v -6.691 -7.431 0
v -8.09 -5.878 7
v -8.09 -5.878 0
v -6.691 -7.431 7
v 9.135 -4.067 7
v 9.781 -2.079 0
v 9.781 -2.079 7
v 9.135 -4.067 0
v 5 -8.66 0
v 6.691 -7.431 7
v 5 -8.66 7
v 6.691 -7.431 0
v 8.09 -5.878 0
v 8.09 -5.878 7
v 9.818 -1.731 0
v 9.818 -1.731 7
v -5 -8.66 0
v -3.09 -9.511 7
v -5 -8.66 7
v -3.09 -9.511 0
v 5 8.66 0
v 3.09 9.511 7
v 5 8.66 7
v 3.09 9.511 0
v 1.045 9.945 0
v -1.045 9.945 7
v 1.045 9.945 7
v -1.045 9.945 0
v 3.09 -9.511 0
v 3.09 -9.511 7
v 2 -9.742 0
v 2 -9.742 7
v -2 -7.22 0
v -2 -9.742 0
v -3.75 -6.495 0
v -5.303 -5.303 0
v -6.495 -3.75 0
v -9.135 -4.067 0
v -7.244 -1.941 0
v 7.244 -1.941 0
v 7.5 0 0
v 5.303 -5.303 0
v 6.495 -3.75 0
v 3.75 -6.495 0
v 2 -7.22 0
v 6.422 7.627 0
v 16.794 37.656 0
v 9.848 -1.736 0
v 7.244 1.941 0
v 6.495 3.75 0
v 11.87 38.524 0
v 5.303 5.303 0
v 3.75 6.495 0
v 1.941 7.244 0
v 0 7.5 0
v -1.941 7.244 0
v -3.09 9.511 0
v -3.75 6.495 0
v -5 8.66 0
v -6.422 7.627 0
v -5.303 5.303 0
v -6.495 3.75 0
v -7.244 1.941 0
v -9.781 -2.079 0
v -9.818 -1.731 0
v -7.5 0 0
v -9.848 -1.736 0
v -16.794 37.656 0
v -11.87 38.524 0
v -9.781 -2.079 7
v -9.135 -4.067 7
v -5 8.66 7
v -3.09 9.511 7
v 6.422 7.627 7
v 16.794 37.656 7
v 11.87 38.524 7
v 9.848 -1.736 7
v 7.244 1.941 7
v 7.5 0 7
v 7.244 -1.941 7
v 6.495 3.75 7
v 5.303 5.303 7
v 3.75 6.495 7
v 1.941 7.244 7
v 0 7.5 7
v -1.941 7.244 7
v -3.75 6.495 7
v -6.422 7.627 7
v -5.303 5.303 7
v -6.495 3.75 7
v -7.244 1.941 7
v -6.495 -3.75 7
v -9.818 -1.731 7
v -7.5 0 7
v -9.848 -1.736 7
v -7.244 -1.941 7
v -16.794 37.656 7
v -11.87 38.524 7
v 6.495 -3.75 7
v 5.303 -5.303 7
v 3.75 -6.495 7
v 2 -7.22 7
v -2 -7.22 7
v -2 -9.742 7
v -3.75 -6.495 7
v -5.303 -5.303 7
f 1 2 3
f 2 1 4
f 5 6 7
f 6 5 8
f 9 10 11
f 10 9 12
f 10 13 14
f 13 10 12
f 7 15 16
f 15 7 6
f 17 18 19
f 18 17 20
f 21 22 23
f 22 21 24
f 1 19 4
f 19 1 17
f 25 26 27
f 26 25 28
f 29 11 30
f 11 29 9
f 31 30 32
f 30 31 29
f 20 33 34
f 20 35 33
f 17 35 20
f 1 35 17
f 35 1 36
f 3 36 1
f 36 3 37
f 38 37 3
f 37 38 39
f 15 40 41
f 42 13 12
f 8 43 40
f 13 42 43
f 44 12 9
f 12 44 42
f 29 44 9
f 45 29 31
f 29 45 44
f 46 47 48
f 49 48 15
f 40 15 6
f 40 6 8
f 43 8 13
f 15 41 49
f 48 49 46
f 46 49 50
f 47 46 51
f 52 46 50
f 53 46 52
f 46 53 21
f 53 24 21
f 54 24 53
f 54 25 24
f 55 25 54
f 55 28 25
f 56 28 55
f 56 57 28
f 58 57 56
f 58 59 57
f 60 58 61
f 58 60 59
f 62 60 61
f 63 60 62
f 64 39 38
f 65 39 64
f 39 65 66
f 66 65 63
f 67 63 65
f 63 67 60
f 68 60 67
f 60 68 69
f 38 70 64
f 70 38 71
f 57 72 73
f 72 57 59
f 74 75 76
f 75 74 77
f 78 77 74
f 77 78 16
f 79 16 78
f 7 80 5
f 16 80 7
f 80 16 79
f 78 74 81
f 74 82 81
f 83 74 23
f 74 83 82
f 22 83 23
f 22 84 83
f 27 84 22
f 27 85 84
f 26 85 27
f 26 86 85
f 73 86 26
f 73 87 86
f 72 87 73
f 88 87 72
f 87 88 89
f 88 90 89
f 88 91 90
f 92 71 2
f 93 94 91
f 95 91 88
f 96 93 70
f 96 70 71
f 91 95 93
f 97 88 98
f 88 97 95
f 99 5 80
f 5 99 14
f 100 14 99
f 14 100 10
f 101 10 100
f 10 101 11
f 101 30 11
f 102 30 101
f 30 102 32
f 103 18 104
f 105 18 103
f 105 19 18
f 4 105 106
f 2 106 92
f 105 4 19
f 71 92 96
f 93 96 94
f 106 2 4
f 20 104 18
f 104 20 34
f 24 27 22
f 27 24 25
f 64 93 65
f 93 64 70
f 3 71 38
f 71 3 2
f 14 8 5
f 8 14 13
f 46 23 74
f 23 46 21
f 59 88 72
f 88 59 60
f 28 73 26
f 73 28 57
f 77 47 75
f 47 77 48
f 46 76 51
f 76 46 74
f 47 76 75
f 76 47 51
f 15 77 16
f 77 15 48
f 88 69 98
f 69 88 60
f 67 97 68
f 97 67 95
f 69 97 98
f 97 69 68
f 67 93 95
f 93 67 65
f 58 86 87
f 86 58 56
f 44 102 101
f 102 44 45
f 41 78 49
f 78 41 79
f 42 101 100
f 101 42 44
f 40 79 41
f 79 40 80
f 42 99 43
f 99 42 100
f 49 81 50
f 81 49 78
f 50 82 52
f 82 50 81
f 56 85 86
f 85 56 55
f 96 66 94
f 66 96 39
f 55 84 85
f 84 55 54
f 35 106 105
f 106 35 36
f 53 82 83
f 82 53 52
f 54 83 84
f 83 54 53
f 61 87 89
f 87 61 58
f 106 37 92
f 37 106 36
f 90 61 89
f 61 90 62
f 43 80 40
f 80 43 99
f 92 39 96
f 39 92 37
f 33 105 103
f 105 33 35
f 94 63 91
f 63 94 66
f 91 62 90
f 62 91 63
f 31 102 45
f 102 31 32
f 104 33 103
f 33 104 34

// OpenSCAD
difference() //feel free to change or make your own
{
union(){
cylinder(7,d=20,center=false); //outer circle
rotate([0,0,-10])translate([5,0,0])cube([5,40,7], center=false);
rotate([0,0,10])translate([-10,0,0])cube([5,40,7], center=false);
}
union(){
cylinder(7,d=15,center=false); // inner size
translate([-2,-10,0])cube([4,10,7], center=false); //cut out
}
}
